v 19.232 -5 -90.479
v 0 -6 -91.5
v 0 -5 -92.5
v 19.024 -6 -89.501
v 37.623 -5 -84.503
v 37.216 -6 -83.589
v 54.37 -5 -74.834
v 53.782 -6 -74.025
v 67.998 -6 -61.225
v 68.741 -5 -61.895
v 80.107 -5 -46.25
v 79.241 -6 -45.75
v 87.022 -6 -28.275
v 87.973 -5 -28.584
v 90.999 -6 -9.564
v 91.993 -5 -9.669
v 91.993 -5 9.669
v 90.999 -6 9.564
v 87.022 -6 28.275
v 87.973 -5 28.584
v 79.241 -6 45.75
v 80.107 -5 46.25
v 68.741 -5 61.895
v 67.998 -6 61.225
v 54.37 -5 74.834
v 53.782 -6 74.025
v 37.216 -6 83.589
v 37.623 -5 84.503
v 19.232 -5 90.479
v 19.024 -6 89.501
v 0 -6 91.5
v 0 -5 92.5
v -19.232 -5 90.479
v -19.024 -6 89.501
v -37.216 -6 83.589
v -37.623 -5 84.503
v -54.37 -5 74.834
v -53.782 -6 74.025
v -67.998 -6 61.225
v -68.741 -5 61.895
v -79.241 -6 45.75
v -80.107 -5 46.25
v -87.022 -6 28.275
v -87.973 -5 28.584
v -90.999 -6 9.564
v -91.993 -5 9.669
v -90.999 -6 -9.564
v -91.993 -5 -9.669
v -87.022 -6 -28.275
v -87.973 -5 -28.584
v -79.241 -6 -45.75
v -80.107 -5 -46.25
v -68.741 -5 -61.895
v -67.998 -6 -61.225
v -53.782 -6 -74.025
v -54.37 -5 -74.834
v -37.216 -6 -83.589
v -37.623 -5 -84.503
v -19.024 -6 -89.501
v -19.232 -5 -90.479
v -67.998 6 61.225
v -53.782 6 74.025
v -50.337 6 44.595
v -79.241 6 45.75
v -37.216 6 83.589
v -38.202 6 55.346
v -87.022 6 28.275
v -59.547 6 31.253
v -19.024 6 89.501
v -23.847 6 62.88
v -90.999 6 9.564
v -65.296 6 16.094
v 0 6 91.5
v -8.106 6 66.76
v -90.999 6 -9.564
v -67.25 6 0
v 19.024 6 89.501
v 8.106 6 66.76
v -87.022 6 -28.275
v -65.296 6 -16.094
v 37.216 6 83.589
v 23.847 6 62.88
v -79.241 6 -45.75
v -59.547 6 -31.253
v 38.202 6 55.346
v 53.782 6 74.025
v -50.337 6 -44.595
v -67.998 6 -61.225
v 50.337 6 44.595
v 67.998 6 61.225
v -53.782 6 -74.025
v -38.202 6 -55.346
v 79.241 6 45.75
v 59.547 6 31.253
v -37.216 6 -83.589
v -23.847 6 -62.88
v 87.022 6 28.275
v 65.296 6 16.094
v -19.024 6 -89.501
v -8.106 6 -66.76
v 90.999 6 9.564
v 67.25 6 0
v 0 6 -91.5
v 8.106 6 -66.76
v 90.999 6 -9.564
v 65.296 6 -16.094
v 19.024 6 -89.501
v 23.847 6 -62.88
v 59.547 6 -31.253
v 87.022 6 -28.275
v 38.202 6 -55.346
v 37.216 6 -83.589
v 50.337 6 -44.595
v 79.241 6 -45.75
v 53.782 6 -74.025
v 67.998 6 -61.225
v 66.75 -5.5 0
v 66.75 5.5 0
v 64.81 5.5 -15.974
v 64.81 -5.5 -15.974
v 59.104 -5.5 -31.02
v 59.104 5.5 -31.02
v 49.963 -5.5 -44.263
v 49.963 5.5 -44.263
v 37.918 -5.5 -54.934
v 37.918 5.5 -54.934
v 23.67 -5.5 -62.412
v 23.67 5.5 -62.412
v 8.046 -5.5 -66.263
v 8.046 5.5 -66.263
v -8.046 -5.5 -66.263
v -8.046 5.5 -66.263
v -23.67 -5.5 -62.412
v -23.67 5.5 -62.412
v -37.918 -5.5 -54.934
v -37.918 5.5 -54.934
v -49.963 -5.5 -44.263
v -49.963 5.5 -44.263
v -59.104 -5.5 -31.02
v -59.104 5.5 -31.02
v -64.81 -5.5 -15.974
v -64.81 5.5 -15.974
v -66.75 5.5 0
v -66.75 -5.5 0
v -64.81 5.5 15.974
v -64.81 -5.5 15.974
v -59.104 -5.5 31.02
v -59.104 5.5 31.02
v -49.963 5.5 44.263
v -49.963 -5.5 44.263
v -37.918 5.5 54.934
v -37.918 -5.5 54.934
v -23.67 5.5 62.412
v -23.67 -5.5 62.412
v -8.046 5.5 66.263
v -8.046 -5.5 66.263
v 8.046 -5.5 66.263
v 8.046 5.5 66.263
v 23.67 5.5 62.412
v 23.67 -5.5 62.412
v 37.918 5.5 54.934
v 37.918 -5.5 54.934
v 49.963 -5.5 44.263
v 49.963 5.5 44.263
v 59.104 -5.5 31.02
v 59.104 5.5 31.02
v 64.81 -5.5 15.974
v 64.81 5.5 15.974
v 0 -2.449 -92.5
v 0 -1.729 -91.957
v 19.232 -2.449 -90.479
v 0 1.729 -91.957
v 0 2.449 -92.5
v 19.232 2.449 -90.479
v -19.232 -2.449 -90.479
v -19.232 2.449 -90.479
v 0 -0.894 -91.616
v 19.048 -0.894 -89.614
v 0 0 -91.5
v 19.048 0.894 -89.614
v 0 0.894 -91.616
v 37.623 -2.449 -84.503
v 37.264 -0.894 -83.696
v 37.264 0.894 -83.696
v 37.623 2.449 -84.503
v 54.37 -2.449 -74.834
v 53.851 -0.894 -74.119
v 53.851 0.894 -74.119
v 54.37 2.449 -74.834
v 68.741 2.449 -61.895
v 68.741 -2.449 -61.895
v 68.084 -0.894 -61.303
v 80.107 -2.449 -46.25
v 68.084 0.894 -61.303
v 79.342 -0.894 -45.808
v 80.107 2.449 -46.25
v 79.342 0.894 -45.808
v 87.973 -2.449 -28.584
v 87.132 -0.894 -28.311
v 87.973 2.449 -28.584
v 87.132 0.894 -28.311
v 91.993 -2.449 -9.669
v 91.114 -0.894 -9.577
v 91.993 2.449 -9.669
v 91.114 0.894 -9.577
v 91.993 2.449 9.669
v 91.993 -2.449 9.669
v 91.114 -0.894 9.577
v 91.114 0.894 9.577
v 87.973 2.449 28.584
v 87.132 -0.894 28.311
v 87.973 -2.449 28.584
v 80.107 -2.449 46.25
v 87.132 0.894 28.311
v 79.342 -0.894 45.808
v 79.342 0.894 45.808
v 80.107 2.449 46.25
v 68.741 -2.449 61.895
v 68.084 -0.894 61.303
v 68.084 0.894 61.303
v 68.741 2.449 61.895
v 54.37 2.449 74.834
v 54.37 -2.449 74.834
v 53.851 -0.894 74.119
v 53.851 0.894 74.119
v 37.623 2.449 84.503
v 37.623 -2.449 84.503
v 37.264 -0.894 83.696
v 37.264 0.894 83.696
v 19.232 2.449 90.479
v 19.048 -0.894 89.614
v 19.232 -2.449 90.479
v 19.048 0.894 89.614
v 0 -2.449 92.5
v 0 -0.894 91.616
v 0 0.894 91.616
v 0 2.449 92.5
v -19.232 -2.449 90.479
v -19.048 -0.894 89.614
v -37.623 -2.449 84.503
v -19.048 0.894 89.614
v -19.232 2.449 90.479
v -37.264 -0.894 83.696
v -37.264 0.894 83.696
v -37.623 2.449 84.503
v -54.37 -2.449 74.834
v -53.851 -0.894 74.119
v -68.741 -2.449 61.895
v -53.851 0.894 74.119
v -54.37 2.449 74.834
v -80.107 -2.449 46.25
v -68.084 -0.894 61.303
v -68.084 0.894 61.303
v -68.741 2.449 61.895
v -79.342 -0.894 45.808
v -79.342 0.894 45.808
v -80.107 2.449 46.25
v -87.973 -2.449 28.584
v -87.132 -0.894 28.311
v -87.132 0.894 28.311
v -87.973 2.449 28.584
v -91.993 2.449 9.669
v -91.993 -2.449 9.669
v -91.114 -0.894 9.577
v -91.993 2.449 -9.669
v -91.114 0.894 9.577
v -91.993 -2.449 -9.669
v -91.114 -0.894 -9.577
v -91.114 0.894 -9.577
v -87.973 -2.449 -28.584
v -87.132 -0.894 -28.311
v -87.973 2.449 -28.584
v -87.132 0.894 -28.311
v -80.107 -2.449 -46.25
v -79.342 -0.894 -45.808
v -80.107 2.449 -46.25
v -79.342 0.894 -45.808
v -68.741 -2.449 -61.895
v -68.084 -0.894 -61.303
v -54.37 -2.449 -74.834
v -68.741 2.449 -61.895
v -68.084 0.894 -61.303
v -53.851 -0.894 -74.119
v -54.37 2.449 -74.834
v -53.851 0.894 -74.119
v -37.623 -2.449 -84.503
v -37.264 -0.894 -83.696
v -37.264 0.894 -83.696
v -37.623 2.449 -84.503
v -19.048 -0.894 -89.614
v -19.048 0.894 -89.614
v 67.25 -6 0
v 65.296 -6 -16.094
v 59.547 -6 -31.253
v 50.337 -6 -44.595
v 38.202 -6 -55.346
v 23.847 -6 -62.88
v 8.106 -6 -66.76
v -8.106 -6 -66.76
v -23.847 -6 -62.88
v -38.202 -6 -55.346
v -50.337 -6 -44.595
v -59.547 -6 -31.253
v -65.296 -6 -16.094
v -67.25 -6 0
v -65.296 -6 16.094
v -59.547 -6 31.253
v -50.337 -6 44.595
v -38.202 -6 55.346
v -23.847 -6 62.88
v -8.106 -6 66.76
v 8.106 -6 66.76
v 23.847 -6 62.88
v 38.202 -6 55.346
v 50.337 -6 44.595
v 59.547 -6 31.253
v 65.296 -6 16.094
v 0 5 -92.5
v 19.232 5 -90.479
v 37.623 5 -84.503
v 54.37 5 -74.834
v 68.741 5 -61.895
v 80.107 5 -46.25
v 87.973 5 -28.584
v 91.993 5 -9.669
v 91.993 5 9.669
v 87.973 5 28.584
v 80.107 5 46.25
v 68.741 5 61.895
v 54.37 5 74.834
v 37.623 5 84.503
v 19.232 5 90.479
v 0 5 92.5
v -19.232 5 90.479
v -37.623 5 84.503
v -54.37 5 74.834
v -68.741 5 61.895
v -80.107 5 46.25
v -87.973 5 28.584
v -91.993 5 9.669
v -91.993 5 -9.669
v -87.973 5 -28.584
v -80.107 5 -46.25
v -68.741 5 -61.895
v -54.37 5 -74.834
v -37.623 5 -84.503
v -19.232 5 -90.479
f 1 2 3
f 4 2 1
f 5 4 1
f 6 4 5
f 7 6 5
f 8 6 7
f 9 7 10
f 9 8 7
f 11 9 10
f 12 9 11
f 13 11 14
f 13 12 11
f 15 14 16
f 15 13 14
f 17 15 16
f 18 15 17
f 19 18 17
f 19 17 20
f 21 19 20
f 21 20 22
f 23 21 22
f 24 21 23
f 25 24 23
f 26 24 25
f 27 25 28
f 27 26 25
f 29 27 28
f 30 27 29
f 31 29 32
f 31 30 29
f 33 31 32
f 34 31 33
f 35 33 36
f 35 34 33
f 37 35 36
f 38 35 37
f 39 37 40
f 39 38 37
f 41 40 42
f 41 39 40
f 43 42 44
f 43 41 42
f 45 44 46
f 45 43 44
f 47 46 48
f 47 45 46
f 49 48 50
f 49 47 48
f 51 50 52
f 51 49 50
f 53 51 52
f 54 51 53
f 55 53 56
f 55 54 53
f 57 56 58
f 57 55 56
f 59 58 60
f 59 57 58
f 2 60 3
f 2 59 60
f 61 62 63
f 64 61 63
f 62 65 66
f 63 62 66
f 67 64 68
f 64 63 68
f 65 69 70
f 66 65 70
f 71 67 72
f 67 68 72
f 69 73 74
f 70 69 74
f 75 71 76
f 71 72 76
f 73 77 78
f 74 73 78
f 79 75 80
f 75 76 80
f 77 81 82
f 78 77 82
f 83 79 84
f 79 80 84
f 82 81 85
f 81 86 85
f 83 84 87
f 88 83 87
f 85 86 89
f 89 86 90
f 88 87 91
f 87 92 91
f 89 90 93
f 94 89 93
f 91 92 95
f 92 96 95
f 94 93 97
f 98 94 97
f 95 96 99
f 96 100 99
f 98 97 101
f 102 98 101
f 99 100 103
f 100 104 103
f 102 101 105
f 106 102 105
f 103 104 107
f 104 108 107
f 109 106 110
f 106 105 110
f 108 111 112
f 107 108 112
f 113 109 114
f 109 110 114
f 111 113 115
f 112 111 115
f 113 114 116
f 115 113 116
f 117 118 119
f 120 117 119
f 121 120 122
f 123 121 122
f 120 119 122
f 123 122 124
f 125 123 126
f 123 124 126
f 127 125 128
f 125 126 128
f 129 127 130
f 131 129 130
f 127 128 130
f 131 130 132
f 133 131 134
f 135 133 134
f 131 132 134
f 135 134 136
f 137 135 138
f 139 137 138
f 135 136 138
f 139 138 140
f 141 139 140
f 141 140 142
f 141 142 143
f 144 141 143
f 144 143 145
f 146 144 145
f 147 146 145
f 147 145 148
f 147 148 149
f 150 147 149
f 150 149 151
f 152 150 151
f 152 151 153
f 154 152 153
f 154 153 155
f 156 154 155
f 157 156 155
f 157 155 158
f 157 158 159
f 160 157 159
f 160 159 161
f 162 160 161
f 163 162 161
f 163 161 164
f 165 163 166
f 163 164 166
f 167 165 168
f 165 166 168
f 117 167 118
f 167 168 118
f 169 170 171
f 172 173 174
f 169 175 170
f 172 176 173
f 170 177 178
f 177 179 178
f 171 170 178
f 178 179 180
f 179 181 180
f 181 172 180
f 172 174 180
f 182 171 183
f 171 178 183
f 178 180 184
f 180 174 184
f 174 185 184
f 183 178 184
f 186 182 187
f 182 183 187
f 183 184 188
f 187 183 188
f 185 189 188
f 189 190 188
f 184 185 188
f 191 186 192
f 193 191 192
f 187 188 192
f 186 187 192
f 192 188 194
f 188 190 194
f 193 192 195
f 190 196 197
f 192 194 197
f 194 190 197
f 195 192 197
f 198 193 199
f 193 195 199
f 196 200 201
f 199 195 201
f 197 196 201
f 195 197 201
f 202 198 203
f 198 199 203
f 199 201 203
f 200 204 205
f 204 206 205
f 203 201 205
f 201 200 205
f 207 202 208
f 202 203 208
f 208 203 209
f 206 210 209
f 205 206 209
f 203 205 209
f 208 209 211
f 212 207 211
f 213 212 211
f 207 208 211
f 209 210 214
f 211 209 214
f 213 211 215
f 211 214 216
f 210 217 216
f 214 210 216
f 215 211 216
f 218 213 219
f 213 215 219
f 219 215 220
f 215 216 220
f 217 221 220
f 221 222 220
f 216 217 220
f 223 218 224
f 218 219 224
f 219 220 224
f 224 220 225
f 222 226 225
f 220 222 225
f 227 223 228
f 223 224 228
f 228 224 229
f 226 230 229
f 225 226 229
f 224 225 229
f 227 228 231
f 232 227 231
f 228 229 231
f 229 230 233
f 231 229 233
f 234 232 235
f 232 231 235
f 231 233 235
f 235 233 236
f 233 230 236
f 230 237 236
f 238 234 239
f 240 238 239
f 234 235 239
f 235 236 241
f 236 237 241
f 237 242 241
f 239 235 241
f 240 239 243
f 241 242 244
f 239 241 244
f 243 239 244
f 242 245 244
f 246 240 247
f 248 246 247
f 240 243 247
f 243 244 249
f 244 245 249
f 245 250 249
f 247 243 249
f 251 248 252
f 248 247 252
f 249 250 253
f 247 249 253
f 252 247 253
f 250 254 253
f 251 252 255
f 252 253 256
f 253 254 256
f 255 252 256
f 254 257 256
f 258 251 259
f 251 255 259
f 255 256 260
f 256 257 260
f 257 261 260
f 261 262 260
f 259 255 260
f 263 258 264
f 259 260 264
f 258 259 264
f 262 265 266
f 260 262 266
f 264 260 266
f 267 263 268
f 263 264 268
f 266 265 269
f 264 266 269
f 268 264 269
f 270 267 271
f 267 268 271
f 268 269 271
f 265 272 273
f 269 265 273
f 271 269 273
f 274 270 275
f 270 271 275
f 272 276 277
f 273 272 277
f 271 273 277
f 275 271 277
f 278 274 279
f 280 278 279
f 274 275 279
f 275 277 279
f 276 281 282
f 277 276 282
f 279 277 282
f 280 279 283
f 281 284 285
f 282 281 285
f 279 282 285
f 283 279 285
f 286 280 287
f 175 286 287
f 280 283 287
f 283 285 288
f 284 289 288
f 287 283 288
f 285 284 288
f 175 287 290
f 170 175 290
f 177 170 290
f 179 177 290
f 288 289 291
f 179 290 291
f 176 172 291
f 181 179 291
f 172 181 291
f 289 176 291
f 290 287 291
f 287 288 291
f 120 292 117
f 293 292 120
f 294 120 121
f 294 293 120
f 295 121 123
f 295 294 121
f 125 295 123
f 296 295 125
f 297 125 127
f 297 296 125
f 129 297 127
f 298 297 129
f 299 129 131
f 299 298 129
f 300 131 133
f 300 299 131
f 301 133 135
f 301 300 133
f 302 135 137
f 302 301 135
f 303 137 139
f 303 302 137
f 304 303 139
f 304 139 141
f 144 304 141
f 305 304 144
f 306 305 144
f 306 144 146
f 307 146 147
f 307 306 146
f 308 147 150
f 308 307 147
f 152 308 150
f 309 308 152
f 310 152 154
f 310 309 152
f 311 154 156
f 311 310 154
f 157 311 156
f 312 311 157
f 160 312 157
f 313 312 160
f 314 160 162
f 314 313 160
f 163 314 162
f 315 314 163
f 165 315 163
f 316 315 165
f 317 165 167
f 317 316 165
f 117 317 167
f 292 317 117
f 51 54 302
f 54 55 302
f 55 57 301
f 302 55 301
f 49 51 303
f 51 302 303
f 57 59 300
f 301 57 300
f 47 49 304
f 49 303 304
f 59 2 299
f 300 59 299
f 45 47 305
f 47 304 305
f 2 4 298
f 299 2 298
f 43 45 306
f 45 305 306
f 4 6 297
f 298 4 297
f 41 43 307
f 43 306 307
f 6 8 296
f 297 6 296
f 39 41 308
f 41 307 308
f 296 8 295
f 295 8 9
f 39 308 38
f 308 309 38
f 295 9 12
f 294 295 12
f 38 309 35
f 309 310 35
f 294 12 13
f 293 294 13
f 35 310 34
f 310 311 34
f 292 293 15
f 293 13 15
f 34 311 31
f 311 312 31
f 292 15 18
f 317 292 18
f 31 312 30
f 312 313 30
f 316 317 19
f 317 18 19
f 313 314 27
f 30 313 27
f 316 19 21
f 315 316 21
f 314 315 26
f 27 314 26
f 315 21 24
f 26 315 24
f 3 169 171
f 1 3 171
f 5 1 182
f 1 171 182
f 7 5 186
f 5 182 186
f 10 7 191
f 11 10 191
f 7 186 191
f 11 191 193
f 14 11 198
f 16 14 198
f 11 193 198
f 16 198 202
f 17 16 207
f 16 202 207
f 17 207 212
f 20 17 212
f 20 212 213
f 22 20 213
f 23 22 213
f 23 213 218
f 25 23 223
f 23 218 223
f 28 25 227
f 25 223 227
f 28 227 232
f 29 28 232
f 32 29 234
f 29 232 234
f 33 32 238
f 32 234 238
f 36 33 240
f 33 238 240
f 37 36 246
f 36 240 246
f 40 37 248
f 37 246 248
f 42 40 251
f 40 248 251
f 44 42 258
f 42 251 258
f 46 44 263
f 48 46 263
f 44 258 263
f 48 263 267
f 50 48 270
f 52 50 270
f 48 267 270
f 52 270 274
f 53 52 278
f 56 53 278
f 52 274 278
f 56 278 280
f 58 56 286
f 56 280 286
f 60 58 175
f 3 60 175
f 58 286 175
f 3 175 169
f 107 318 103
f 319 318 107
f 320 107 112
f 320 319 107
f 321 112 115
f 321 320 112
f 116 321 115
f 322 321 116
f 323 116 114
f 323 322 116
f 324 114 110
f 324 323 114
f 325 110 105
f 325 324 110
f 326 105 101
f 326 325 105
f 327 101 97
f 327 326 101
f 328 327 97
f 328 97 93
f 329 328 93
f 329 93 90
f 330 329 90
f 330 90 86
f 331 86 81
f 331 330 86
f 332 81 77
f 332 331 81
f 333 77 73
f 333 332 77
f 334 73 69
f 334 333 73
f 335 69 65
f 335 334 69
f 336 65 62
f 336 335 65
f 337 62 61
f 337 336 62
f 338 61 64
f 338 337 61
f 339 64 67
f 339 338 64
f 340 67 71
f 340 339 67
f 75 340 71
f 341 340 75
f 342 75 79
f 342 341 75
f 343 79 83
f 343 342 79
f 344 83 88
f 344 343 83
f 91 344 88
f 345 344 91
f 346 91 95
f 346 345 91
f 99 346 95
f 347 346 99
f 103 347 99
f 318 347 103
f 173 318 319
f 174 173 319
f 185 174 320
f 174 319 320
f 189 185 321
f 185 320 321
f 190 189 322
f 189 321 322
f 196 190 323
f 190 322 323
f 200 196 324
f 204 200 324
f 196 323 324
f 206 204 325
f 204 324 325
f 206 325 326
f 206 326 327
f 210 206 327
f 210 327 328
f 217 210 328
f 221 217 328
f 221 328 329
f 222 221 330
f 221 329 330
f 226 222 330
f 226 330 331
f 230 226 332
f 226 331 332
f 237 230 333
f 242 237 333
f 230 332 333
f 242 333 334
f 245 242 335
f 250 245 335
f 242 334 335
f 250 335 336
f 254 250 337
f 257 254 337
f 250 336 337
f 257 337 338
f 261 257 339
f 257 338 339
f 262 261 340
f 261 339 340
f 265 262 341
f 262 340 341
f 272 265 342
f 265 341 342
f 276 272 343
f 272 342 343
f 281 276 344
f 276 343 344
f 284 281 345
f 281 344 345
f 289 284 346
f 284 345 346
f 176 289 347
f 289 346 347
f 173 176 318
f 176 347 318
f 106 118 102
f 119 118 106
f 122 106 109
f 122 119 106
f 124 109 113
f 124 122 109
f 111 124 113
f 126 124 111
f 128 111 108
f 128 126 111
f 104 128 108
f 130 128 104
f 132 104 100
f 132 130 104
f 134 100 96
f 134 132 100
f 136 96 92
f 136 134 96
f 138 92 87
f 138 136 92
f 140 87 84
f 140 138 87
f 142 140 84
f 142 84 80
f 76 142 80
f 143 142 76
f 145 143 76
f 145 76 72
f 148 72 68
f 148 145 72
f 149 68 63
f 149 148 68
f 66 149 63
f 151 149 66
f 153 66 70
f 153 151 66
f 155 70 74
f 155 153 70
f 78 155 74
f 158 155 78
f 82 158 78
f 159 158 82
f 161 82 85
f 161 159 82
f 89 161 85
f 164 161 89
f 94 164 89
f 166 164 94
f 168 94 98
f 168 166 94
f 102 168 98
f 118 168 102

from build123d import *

# Parameters (mm, degrees)
HOLE_WIZARD_2_D = 133.5
CHAMFER_1_SIZE  = 0.5
CHAMFER_2_SIZE2 = 1.000000001
CHAMFER_2_SIZE  = 0.999999999


with BuildPart() as part:
    # 草圖1 → 旋轉1 (revolve)
    with BuildSketch(Plane.XY, mode=Mode.PRIVATE) as revolve_1_sk:
        with BuildLine():
            Line((92.5, 6), (0, 6))
            Line((0, 6), (0, -6))
            Line((0, -6), (92.5, -6))
            Line((92.5, -6), (92.5, -2.449489743))
            ThreePointArc((92.5, -2.449489743), (91.5, 0), (92.5, 2.449489743))
            Line((92.5, 2.449489743), (92.5, 6))
        make_face()
    revolve(revolve_1_sk.sketch.rotate(Axis((0, 6, 0), (0, -1, 0)), 270), axis=Axis((0, 6, 0), (0, -1, 0)))

    # 鑽孔2 (through all)
    with Locations(Plane(origin=(0, -6, 0), x_dir=(-1, 0, 0), z_dir=(0, -1, 0))):
        with Locations((0, 0)):
            Hole(HOLE_WIZARD_2_D / 2)

    # 導角1
    chamfer_1_edges = [part.edges().sort_by_distance(p)[0] for p in [
        (-66.75, -6, 0),
        (-66.75, 6, 0),
    ]]
    chamfer(chamfer_1_edges, length=CHAMFER_1_SIZE)

    # 導角2
    chamfer_2_edges = [part.edges().sort_by_distance(p)[0] for p in [
        (0, 6, 92.5),
        (0, -6, 92.5),
    ]]
    chamfer(chamfer_2_edges, length=CHAMFER_2_SIZE, length2=CHAMFER_2_SIZE2)


solid = part.part
